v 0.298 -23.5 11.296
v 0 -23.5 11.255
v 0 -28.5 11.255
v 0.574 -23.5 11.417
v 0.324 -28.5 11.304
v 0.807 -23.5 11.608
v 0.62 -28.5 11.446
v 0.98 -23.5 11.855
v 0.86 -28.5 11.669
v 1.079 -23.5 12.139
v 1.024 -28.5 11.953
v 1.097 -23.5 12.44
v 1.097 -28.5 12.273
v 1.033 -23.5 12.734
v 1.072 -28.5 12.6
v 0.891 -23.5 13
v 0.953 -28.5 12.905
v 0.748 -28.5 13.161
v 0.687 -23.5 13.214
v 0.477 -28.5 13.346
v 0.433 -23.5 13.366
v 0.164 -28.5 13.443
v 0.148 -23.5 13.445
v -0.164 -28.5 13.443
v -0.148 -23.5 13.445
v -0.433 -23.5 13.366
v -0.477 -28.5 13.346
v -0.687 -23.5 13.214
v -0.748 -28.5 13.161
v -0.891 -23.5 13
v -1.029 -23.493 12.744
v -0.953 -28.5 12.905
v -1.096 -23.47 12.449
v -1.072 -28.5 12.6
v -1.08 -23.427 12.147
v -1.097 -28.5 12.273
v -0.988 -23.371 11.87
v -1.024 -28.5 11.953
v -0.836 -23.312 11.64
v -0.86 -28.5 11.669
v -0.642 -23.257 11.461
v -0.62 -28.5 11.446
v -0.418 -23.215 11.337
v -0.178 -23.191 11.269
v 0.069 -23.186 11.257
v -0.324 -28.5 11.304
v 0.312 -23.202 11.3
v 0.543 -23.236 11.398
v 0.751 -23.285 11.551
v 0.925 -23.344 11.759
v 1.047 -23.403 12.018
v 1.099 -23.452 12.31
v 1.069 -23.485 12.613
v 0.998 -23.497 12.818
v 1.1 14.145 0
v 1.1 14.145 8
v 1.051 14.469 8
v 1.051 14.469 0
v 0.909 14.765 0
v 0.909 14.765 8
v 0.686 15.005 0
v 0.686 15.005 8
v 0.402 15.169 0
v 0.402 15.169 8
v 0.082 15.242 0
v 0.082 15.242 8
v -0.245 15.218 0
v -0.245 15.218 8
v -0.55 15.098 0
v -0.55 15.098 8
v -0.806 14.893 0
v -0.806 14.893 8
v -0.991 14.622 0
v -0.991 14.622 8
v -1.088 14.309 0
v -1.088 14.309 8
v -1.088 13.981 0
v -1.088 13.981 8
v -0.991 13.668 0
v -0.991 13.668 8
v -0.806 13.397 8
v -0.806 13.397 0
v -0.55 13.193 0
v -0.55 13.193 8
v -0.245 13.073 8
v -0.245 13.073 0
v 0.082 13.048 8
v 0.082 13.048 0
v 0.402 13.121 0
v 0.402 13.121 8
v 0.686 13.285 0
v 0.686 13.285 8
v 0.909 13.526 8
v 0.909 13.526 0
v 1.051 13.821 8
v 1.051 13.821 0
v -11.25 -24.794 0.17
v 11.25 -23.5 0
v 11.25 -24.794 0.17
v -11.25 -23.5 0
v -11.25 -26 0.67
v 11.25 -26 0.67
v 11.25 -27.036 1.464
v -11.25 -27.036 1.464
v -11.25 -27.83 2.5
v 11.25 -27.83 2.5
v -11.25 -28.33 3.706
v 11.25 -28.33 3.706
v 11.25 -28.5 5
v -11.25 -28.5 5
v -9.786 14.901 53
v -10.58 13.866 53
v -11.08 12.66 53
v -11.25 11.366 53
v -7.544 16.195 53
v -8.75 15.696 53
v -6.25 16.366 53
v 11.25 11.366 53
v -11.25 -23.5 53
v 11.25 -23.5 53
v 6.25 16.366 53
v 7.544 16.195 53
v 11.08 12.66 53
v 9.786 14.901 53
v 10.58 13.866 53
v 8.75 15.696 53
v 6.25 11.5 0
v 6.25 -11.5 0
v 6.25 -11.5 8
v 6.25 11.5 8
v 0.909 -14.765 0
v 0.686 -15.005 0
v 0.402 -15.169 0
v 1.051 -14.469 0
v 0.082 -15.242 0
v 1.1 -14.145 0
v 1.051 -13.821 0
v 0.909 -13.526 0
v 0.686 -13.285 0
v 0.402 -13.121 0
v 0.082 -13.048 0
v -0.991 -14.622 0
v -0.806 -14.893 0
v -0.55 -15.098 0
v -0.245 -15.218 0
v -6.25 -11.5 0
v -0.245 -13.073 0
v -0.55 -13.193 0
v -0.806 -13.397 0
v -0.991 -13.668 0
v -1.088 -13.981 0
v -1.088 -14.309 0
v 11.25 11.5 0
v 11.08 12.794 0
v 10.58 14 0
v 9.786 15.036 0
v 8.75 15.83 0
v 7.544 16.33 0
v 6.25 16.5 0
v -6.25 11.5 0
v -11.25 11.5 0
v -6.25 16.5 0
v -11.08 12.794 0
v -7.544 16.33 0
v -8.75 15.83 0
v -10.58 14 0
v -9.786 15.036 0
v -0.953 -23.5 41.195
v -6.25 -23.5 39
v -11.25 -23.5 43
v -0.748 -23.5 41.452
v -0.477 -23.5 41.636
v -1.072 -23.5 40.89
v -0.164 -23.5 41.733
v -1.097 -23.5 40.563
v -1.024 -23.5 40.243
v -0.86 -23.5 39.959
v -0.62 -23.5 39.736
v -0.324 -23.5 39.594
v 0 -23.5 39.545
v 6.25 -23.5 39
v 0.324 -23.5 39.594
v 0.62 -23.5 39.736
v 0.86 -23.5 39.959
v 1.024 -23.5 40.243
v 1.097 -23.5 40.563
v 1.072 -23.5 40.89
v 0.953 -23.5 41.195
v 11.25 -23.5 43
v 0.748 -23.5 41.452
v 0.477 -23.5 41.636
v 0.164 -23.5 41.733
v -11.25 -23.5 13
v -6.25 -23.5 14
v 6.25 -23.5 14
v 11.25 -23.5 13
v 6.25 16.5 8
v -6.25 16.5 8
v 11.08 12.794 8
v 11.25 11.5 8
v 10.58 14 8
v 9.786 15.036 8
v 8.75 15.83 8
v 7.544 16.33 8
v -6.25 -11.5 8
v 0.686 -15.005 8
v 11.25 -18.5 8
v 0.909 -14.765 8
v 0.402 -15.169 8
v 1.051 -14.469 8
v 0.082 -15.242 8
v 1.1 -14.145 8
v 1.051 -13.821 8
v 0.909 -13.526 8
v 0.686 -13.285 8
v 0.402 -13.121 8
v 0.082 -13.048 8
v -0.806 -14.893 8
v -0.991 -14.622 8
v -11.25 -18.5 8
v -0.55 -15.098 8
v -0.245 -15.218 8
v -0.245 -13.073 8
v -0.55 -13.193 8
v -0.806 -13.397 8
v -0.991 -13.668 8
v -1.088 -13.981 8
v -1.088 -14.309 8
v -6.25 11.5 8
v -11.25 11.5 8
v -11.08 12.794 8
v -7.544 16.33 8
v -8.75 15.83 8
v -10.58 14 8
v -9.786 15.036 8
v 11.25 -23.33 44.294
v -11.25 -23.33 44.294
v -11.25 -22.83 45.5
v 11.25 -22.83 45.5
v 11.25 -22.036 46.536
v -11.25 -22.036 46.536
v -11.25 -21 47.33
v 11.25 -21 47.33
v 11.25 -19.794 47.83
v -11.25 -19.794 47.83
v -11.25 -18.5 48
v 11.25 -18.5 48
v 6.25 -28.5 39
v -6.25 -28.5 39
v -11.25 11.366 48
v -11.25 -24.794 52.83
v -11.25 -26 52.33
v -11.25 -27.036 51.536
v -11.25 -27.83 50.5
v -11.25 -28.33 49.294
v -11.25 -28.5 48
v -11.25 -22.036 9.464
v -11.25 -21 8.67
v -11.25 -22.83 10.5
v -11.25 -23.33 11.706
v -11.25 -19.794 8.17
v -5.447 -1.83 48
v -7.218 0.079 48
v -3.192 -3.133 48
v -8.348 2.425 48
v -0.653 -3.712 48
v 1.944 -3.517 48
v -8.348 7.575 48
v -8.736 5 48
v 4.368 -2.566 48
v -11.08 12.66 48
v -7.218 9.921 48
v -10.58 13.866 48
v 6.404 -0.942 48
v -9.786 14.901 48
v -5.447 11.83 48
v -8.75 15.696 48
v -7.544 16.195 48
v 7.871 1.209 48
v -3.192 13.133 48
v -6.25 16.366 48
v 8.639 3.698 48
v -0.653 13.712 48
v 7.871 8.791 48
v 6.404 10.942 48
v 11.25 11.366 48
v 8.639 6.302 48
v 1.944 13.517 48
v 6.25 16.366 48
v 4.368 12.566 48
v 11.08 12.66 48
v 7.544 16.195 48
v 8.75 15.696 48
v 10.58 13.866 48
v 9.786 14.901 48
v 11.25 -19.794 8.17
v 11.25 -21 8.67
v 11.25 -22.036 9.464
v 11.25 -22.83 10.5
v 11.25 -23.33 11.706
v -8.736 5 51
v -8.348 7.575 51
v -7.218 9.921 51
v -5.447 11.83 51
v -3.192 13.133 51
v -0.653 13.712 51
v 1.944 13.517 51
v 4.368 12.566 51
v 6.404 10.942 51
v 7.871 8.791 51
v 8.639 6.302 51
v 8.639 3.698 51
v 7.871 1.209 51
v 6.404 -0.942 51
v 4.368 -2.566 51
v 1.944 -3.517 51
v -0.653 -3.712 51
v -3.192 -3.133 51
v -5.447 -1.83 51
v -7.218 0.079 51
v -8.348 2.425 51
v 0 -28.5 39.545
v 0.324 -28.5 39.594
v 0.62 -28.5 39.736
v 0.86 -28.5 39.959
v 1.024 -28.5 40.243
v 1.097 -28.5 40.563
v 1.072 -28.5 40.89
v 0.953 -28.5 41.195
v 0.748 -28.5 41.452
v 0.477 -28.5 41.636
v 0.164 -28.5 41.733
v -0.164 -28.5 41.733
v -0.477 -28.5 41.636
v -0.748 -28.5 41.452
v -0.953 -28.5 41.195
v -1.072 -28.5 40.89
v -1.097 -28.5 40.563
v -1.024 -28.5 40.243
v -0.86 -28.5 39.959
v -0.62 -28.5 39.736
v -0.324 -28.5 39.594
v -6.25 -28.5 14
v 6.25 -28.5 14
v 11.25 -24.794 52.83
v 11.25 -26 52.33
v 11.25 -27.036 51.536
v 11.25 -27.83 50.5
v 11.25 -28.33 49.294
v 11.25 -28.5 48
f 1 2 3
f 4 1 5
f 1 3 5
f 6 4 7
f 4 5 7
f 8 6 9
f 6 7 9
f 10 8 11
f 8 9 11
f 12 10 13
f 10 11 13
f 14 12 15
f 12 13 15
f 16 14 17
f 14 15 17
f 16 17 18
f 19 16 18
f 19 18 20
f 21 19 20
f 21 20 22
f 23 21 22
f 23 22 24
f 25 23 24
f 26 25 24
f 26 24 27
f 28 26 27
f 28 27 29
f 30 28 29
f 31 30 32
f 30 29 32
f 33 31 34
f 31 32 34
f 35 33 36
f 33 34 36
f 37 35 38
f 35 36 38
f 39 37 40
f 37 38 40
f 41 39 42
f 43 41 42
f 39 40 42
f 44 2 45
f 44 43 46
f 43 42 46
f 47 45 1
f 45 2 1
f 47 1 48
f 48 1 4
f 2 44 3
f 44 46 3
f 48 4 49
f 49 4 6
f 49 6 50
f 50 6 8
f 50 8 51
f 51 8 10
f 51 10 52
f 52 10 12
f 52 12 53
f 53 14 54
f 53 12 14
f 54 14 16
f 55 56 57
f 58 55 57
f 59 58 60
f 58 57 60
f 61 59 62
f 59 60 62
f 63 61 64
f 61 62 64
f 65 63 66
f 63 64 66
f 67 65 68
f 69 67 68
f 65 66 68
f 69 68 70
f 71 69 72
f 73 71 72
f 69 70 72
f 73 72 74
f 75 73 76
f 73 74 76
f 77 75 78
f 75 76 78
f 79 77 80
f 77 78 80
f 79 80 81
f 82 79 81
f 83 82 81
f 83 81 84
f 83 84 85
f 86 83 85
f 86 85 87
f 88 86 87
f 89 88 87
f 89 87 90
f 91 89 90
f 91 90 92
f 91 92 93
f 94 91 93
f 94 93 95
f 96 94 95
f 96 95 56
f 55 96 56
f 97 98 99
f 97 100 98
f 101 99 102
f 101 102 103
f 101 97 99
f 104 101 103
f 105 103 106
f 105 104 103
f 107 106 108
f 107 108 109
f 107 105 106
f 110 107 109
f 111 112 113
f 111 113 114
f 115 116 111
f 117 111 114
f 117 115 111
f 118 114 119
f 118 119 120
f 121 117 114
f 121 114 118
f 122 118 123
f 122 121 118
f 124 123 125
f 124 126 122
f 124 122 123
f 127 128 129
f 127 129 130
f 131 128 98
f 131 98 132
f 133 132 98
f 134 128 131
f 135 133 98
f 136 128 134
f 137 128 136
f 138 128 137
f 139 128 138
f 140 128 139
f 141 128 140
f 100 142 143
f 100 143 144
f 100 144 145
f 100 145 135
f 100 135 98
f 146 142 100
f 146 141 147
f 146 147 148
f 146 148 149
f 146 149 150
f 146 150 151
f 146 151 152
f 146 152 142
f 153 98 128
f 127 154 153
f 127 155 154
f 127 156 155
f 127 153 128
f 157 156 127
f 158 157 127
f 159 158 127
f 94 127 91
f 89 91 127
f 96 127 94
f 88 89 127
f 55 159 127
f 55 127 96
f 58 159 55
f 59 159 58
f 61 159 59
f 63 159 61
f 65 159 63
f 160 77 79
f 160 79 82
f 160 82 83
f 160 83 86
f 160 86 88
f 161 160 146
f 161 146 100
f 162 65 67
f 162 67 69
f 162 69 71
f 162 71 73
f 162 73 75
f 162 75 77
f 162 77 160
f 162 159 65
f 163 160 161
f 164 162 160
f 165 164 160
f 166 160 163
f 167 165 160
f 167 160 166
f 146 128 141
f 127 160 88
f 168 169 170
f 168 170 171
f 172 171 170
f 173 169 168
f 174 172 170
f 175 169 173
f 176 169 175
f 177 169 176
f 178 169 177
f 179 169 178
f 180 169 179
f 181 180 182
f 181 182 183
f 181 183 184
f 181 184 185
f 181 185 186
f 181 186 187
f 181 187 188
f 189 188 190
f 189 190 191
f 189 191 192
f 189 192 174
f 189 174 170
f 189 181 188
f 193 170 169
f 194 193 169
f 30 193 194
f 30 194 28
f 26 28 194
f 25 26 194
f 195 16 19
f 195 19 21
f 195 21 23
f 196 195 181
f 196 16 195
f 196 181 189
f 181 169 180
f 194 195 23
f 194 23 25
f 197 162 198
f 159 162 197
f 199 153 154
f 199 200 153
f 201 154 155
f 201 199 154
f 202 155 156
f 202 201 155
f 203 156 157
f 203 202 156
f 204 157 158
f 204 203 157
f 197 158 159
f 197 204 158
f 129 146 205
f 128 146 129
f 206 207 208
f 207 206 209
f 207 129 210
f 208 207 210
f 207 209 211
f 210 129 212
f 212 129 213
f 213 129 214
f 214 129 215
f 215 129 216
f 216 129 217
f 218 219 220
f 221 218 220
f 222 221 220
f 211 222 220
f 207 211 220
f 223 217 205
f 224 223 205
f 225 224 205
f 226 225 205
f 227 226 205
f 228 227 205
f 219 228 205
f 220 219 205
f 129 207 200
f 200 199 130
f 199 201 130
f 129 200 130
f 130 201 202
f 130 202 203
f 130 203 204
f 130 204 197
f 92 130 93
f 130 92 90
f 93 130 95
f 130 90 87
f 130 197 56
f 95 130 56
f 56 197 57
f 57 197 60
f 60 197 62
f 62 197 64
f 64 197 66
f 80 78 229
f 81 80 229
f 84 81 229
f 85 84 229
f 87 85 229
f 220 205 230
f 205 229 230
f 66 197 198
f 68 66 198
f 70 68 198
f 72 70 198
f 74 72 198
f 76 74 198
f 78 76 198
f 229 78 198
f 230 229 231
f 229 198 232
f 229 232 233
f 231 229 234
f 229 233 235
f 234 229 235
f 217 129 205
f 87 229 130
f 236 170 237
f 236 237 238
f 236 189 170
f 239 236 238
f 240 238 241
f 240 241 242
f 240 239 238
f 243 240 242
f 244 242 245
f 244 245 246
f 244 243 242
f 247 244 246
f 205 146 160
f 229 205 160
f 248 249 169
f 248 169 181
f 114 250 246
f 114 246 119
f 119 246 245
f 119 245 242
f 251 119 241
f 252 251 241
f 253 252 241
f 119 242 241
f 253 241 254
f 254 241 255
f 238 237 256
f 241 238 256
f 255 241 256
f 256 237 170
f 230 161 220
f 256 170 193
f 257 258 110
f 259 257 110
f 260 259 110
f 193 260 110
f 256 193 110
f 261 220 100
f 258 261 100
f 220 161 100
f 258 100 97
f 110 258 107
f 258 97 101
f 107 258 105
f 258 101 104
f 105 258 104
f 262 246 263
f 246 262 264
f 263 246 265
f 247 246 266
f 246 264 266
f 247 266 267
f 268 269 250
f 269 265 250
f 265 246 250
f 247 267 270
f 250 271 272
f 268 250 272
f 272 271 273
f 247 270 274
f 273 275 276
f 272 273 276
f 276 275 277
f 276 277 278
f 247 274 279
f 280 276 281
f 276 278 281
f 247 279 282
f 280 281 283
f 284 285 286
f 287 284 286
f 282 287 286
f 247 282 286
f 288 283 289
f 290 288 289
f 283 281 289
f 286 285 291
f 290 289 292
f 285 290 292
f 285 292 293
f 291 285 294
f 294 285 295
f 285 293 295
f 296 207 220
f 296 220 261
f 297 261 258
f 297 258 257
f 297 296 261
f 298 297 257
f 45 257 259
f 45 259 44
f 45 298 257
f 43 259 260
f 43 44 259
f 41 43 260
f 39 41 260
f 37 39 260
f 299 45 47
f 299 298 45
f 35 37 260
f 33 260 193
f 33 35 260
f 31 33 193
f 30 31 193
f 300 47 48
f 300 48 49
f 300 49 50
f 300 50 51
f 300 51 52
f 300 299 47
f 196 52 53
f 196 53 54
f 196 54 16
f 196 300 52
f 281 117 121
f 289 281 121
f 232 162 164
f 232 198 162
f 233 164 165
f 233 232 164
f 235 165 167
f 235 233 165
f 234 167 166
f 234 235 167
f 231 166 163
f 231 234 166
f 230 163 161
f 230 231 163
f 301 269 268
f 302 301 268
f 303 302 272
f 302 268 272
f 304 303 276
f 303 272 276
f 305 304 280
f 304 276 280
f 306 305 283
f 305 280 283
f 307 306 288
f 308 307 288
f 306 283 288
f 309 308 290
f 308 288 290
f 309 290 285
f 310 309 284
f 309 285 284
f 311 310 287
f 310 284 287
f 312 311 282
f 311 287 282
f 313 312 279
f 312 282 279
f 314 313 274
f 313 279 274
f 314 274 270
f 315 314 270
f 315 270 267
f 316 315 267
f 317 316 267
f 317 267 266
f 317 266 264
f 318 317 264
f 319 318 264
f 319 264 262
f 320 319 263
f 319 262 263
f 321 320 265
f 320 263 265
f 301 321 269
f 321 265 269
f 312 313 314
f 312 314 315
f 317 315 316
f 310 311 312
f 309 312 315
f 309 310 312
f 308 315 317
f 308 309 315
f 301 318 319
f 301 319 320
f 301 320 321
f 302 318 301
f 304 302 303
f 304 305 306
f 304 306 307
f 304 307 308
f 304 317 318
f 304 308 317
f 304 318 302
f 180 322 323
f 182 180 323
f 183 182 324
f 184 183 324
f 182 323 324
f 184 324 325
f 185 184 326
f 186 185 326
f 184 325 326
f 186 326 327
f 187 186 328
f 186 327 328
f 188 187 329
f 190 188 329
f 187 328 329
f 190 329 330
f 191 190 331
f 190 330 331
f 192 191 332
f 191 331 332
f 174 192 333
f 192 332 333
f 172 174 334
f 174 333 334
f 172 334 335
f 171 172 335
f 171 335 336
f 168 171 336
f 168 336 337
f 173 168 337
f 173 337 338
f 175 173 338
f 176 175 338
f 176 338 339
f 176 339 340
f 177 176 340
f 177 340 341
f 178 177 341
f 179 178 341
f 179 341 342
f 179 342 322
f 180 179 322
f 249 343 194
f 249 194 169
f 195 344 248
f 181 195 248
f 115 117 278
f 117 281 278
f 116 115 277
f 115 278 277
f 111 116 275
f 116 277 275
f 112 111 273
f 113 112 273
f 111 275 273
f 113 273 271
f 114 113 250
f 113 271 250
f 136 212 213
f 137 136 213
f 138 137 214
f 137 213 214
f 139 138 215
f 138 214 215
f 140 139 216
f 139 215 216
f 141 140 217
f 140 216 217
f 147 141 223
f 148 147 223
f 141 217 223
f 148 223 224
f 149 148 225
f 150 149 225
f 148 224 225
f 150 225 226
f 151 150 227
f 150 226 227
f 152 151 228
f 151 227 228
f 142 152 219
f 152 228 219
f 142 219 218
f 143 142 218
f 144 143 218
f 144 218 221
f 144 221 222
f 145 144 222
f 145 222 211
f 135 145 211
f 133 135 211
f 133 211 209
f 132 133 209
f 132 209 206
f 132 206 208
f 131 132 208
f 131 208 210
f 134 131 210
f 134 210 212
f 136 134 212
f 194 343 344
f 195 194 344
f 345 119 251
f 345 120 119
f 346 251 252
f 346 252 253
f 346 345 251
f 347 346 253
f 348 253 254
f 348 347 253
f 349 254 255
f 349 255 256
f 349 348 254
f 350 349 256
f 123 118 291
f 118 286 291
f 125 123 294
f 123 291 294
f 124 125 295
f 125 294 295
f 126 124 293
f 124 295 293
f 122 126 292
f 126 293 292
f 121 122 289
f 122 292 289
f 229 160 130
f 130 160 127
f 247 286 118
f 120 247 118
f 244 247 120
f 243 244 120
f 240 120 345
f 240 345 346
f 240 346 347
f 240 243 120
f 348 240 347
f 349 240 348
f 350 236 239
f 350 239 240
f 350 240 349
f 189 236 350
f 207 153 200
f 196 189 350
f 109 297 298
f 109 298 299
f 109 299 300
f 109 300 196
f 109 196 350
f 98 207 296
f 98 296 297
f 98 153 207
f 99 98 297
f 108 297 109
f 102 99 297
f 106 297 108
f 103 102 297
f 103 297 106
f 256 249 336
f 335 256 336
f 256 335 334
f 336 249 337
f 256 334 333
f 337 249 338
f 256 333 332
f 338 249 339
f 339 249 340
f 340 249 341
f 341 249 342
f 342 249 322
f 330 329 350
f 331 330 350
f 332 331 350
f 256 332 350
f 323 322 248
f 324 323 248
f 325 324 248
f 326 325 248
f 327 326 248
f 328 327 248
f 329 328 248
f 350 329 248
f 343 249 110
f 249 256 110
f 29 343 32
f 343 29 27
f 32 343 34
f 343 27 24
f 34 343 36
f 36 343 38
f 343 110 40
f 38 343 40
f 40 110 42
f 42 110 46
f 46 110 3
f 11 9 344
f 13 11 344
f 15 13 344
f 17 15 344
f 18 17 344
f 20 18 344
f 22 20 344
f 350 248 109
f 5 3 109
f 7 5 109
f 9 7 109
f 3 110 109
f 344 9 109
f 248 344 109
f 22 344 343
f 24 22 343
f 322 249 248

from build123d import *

# Parameters (mm, degrees)
SKETCH1_W           = 22.5
SKETCH1_H           = 33
SKETCH1_W_2         = 12.5
SKETCH1_H_2         = 23
BOSS_EXTRUDE1_DEPTH = 8
SKETCH2_R           = 1.1
CUT_EXTRUDE1_DEPTH  = 22.513077418
SKETCH4_W           = 22.5
SKETCH4_H           = 12
BOSS_EXTRUDE3_DEPTH = 8
SKETCH5_W           = 22.5
SKETCH5_H           = 5
BOSS_EXTRUDE4_DEPTH = 45
SKETCH6_W           = 12.5
SKETCH6_H           = 25
CUT_EXTRUDE2_DEPTH  = 71.431260815
SKETCH7_R           = 1.1
CUT_EXTRUDE3_DEPTH  = 65
FILLET1_R           = 5
SKETCH9_W           = 22.5
SKETCH9_H           = 44.865556073
BOSS_EXTRUDE5_DEPTH = 5
SKETCH10_R          = 8.736478528
CUT_EXTRUDE4_DEPTH  = 3
FILLET2_R           = 5
FILLET3_R           = 5
FILLET4_R           = 5


with BuildPart() as part:
    # Sketch1 → Boss-Extrude1 (new body)
    with BuildSketch(Plane.XY):
        Rectangle(SKETCH1_W, SKETCH1_H)
        Rectangle(SKETCH1_W_2, SKETCH1_H_2, mode=Mode.SUBTRACT)
    extrude(amount=BOSS_EXTRUDE1_DEPTH)

    # Sketch2 → Cut-Extrude1 (cut, through all)
    with BuildSketch(Plane.XY.offset(8)):
        with Locations((0, -14.145204103)):
            Circle(SKETCH2_R)
        with Locations((0, 14.145204103)):
            Circle(SKETCH2_R)
    extrude(amount=-CUT_EXTRUDE1_DEPTH, mode=Mode.SUBTRACT)

    # Sketch4 → Boss-Extrude3 (add)
    with BuildSketch(Plane(origin=(0, 0, 0), x_dir=(-1, 0, 0), z_dir=(0, 0, -1))):
        with Locations((0, -22.5)):
            Rectangle(SKETCH4_W, SKETCH4_H)
    extrude(amount=-BOSS_EXTRUDE3_DEPTH)

    # Sketch5 → Boss-Extrude4 (add)
    with BuildSketch(Plane.XY.offset(8)):
        with Locations((0, -26)):
            Rectangle(SKETCH5_W, SKETCH5_H)
    extrude(amount=BOSS_EXTRUDE4_DEPTH)

    # Sketch6 → Cut-Extrude2 (cut, through all)
    with BuildSketch(Plane.XZ.offset(28.5)):
        with Locations((0, 26.5)):
            Rectangle(SKETCH6_W, SKETCH6_H)
    extrude(amount=-CUT_EXTRUDE2_DEPTH, mode=Mode.SUBTRACT)

    # Sketch7 → Cut-Extrude3 (cut)
    with BuildSketch(Plane.XZ.offset(28.5)):
        with Locations(Location((0, 40.645204103, 0), (0, 0, 270))):
            Circle(SKETCH7_R)
        with Locations(Location((0, 12.354795897, 0), (0, 0, 270))):
            Circle(SKETCH7_R)
    extrude(amount=-CUT_EXTRUDE3_DEPTH, mode=Mode.SUBTRACT)

    # Fillet1
    # the kernel refuses this fillet: 5 mm, written as the material it adds along each edge
    with BuildSketch(Plane(origin=(11.25, -23.5, 8), x_dir=(0, 1, 0), z_dir=(-1, 0, 0))) as fillet1_piece_1_section:
        with BuildLine():
            CenterArc((FILLET1_R, -FILLET1_R), FILLET1_R, 90, 90)
            Line((0, -FILLET1_R), (0, 0))
            Line((0, 0), (FILLET1_R, 0))
        make_face()
    fillet1_piece_1 = extrude(amount=22.5, mode=Mode.PRIVATE)
    fillet1_piece_1 = fillet1_piece_1 - Plane(origin=(0, -22.363323705, 12.354795897), x_dir=(0, 0, -1), z_dir=(0, -1, 0)) * Cylinder(1.1, 65, mode=Mode.PRIVATE)
    add(fillet1_piece_1)

    # Sketch9 → Boss-Extrude5 (add)
    with BuildSketch(Plane.XY.offset(53)):
        with Locations((0, -6.067221963)):
            Rectangle(SKETCH9_W, SKETCH9_H)
    extrude(amount=-BOSS_EXTRUDE5_DEPTH)

    # Sketch10 → Cut-Extrude4 (cut)
    with BuildSketch(Plane(origin=(0, 0, 48), x_dir=(-1, 0, 0), z_dir=(0, 0, -1))):
        with Locations((0, 5)):
            Circle(SKETCH10_R)
    extrude(amount=-CUT_EXTRUDE4_DEPTH, mode=Mode.SUBTRACT)

    # Fillet2
    fillet2_edges = [part.edges().sort_by_distance(p)[0] for p in [
        (0, -23.5, 48),
    ]]
    fillet(fillet2_edges, radius=FILLET2_R)

    # Fillet3
    fillet3_edges = [part.edges().sort_by_distance(p)[0] for p in [
        (0, -28.5, 0),
        (0, -28.5, 53),
    ]]
    fillet(fillet3_edges, radius=FILLET3_R)

    # Fillet4
    fillet4_edges = [part.edges().sort_by_distance(p)[0] for p in [
        (11.25, 16.365556073, 50.5),
        (-11.25, 16.365556073, 50.5),
        (-11.25, 16.5, 4),
        (11.25, 16.5, 4),
    ]]
    fillet(fillet4_edges, radius=FILLET4_R)


solid = part.part
